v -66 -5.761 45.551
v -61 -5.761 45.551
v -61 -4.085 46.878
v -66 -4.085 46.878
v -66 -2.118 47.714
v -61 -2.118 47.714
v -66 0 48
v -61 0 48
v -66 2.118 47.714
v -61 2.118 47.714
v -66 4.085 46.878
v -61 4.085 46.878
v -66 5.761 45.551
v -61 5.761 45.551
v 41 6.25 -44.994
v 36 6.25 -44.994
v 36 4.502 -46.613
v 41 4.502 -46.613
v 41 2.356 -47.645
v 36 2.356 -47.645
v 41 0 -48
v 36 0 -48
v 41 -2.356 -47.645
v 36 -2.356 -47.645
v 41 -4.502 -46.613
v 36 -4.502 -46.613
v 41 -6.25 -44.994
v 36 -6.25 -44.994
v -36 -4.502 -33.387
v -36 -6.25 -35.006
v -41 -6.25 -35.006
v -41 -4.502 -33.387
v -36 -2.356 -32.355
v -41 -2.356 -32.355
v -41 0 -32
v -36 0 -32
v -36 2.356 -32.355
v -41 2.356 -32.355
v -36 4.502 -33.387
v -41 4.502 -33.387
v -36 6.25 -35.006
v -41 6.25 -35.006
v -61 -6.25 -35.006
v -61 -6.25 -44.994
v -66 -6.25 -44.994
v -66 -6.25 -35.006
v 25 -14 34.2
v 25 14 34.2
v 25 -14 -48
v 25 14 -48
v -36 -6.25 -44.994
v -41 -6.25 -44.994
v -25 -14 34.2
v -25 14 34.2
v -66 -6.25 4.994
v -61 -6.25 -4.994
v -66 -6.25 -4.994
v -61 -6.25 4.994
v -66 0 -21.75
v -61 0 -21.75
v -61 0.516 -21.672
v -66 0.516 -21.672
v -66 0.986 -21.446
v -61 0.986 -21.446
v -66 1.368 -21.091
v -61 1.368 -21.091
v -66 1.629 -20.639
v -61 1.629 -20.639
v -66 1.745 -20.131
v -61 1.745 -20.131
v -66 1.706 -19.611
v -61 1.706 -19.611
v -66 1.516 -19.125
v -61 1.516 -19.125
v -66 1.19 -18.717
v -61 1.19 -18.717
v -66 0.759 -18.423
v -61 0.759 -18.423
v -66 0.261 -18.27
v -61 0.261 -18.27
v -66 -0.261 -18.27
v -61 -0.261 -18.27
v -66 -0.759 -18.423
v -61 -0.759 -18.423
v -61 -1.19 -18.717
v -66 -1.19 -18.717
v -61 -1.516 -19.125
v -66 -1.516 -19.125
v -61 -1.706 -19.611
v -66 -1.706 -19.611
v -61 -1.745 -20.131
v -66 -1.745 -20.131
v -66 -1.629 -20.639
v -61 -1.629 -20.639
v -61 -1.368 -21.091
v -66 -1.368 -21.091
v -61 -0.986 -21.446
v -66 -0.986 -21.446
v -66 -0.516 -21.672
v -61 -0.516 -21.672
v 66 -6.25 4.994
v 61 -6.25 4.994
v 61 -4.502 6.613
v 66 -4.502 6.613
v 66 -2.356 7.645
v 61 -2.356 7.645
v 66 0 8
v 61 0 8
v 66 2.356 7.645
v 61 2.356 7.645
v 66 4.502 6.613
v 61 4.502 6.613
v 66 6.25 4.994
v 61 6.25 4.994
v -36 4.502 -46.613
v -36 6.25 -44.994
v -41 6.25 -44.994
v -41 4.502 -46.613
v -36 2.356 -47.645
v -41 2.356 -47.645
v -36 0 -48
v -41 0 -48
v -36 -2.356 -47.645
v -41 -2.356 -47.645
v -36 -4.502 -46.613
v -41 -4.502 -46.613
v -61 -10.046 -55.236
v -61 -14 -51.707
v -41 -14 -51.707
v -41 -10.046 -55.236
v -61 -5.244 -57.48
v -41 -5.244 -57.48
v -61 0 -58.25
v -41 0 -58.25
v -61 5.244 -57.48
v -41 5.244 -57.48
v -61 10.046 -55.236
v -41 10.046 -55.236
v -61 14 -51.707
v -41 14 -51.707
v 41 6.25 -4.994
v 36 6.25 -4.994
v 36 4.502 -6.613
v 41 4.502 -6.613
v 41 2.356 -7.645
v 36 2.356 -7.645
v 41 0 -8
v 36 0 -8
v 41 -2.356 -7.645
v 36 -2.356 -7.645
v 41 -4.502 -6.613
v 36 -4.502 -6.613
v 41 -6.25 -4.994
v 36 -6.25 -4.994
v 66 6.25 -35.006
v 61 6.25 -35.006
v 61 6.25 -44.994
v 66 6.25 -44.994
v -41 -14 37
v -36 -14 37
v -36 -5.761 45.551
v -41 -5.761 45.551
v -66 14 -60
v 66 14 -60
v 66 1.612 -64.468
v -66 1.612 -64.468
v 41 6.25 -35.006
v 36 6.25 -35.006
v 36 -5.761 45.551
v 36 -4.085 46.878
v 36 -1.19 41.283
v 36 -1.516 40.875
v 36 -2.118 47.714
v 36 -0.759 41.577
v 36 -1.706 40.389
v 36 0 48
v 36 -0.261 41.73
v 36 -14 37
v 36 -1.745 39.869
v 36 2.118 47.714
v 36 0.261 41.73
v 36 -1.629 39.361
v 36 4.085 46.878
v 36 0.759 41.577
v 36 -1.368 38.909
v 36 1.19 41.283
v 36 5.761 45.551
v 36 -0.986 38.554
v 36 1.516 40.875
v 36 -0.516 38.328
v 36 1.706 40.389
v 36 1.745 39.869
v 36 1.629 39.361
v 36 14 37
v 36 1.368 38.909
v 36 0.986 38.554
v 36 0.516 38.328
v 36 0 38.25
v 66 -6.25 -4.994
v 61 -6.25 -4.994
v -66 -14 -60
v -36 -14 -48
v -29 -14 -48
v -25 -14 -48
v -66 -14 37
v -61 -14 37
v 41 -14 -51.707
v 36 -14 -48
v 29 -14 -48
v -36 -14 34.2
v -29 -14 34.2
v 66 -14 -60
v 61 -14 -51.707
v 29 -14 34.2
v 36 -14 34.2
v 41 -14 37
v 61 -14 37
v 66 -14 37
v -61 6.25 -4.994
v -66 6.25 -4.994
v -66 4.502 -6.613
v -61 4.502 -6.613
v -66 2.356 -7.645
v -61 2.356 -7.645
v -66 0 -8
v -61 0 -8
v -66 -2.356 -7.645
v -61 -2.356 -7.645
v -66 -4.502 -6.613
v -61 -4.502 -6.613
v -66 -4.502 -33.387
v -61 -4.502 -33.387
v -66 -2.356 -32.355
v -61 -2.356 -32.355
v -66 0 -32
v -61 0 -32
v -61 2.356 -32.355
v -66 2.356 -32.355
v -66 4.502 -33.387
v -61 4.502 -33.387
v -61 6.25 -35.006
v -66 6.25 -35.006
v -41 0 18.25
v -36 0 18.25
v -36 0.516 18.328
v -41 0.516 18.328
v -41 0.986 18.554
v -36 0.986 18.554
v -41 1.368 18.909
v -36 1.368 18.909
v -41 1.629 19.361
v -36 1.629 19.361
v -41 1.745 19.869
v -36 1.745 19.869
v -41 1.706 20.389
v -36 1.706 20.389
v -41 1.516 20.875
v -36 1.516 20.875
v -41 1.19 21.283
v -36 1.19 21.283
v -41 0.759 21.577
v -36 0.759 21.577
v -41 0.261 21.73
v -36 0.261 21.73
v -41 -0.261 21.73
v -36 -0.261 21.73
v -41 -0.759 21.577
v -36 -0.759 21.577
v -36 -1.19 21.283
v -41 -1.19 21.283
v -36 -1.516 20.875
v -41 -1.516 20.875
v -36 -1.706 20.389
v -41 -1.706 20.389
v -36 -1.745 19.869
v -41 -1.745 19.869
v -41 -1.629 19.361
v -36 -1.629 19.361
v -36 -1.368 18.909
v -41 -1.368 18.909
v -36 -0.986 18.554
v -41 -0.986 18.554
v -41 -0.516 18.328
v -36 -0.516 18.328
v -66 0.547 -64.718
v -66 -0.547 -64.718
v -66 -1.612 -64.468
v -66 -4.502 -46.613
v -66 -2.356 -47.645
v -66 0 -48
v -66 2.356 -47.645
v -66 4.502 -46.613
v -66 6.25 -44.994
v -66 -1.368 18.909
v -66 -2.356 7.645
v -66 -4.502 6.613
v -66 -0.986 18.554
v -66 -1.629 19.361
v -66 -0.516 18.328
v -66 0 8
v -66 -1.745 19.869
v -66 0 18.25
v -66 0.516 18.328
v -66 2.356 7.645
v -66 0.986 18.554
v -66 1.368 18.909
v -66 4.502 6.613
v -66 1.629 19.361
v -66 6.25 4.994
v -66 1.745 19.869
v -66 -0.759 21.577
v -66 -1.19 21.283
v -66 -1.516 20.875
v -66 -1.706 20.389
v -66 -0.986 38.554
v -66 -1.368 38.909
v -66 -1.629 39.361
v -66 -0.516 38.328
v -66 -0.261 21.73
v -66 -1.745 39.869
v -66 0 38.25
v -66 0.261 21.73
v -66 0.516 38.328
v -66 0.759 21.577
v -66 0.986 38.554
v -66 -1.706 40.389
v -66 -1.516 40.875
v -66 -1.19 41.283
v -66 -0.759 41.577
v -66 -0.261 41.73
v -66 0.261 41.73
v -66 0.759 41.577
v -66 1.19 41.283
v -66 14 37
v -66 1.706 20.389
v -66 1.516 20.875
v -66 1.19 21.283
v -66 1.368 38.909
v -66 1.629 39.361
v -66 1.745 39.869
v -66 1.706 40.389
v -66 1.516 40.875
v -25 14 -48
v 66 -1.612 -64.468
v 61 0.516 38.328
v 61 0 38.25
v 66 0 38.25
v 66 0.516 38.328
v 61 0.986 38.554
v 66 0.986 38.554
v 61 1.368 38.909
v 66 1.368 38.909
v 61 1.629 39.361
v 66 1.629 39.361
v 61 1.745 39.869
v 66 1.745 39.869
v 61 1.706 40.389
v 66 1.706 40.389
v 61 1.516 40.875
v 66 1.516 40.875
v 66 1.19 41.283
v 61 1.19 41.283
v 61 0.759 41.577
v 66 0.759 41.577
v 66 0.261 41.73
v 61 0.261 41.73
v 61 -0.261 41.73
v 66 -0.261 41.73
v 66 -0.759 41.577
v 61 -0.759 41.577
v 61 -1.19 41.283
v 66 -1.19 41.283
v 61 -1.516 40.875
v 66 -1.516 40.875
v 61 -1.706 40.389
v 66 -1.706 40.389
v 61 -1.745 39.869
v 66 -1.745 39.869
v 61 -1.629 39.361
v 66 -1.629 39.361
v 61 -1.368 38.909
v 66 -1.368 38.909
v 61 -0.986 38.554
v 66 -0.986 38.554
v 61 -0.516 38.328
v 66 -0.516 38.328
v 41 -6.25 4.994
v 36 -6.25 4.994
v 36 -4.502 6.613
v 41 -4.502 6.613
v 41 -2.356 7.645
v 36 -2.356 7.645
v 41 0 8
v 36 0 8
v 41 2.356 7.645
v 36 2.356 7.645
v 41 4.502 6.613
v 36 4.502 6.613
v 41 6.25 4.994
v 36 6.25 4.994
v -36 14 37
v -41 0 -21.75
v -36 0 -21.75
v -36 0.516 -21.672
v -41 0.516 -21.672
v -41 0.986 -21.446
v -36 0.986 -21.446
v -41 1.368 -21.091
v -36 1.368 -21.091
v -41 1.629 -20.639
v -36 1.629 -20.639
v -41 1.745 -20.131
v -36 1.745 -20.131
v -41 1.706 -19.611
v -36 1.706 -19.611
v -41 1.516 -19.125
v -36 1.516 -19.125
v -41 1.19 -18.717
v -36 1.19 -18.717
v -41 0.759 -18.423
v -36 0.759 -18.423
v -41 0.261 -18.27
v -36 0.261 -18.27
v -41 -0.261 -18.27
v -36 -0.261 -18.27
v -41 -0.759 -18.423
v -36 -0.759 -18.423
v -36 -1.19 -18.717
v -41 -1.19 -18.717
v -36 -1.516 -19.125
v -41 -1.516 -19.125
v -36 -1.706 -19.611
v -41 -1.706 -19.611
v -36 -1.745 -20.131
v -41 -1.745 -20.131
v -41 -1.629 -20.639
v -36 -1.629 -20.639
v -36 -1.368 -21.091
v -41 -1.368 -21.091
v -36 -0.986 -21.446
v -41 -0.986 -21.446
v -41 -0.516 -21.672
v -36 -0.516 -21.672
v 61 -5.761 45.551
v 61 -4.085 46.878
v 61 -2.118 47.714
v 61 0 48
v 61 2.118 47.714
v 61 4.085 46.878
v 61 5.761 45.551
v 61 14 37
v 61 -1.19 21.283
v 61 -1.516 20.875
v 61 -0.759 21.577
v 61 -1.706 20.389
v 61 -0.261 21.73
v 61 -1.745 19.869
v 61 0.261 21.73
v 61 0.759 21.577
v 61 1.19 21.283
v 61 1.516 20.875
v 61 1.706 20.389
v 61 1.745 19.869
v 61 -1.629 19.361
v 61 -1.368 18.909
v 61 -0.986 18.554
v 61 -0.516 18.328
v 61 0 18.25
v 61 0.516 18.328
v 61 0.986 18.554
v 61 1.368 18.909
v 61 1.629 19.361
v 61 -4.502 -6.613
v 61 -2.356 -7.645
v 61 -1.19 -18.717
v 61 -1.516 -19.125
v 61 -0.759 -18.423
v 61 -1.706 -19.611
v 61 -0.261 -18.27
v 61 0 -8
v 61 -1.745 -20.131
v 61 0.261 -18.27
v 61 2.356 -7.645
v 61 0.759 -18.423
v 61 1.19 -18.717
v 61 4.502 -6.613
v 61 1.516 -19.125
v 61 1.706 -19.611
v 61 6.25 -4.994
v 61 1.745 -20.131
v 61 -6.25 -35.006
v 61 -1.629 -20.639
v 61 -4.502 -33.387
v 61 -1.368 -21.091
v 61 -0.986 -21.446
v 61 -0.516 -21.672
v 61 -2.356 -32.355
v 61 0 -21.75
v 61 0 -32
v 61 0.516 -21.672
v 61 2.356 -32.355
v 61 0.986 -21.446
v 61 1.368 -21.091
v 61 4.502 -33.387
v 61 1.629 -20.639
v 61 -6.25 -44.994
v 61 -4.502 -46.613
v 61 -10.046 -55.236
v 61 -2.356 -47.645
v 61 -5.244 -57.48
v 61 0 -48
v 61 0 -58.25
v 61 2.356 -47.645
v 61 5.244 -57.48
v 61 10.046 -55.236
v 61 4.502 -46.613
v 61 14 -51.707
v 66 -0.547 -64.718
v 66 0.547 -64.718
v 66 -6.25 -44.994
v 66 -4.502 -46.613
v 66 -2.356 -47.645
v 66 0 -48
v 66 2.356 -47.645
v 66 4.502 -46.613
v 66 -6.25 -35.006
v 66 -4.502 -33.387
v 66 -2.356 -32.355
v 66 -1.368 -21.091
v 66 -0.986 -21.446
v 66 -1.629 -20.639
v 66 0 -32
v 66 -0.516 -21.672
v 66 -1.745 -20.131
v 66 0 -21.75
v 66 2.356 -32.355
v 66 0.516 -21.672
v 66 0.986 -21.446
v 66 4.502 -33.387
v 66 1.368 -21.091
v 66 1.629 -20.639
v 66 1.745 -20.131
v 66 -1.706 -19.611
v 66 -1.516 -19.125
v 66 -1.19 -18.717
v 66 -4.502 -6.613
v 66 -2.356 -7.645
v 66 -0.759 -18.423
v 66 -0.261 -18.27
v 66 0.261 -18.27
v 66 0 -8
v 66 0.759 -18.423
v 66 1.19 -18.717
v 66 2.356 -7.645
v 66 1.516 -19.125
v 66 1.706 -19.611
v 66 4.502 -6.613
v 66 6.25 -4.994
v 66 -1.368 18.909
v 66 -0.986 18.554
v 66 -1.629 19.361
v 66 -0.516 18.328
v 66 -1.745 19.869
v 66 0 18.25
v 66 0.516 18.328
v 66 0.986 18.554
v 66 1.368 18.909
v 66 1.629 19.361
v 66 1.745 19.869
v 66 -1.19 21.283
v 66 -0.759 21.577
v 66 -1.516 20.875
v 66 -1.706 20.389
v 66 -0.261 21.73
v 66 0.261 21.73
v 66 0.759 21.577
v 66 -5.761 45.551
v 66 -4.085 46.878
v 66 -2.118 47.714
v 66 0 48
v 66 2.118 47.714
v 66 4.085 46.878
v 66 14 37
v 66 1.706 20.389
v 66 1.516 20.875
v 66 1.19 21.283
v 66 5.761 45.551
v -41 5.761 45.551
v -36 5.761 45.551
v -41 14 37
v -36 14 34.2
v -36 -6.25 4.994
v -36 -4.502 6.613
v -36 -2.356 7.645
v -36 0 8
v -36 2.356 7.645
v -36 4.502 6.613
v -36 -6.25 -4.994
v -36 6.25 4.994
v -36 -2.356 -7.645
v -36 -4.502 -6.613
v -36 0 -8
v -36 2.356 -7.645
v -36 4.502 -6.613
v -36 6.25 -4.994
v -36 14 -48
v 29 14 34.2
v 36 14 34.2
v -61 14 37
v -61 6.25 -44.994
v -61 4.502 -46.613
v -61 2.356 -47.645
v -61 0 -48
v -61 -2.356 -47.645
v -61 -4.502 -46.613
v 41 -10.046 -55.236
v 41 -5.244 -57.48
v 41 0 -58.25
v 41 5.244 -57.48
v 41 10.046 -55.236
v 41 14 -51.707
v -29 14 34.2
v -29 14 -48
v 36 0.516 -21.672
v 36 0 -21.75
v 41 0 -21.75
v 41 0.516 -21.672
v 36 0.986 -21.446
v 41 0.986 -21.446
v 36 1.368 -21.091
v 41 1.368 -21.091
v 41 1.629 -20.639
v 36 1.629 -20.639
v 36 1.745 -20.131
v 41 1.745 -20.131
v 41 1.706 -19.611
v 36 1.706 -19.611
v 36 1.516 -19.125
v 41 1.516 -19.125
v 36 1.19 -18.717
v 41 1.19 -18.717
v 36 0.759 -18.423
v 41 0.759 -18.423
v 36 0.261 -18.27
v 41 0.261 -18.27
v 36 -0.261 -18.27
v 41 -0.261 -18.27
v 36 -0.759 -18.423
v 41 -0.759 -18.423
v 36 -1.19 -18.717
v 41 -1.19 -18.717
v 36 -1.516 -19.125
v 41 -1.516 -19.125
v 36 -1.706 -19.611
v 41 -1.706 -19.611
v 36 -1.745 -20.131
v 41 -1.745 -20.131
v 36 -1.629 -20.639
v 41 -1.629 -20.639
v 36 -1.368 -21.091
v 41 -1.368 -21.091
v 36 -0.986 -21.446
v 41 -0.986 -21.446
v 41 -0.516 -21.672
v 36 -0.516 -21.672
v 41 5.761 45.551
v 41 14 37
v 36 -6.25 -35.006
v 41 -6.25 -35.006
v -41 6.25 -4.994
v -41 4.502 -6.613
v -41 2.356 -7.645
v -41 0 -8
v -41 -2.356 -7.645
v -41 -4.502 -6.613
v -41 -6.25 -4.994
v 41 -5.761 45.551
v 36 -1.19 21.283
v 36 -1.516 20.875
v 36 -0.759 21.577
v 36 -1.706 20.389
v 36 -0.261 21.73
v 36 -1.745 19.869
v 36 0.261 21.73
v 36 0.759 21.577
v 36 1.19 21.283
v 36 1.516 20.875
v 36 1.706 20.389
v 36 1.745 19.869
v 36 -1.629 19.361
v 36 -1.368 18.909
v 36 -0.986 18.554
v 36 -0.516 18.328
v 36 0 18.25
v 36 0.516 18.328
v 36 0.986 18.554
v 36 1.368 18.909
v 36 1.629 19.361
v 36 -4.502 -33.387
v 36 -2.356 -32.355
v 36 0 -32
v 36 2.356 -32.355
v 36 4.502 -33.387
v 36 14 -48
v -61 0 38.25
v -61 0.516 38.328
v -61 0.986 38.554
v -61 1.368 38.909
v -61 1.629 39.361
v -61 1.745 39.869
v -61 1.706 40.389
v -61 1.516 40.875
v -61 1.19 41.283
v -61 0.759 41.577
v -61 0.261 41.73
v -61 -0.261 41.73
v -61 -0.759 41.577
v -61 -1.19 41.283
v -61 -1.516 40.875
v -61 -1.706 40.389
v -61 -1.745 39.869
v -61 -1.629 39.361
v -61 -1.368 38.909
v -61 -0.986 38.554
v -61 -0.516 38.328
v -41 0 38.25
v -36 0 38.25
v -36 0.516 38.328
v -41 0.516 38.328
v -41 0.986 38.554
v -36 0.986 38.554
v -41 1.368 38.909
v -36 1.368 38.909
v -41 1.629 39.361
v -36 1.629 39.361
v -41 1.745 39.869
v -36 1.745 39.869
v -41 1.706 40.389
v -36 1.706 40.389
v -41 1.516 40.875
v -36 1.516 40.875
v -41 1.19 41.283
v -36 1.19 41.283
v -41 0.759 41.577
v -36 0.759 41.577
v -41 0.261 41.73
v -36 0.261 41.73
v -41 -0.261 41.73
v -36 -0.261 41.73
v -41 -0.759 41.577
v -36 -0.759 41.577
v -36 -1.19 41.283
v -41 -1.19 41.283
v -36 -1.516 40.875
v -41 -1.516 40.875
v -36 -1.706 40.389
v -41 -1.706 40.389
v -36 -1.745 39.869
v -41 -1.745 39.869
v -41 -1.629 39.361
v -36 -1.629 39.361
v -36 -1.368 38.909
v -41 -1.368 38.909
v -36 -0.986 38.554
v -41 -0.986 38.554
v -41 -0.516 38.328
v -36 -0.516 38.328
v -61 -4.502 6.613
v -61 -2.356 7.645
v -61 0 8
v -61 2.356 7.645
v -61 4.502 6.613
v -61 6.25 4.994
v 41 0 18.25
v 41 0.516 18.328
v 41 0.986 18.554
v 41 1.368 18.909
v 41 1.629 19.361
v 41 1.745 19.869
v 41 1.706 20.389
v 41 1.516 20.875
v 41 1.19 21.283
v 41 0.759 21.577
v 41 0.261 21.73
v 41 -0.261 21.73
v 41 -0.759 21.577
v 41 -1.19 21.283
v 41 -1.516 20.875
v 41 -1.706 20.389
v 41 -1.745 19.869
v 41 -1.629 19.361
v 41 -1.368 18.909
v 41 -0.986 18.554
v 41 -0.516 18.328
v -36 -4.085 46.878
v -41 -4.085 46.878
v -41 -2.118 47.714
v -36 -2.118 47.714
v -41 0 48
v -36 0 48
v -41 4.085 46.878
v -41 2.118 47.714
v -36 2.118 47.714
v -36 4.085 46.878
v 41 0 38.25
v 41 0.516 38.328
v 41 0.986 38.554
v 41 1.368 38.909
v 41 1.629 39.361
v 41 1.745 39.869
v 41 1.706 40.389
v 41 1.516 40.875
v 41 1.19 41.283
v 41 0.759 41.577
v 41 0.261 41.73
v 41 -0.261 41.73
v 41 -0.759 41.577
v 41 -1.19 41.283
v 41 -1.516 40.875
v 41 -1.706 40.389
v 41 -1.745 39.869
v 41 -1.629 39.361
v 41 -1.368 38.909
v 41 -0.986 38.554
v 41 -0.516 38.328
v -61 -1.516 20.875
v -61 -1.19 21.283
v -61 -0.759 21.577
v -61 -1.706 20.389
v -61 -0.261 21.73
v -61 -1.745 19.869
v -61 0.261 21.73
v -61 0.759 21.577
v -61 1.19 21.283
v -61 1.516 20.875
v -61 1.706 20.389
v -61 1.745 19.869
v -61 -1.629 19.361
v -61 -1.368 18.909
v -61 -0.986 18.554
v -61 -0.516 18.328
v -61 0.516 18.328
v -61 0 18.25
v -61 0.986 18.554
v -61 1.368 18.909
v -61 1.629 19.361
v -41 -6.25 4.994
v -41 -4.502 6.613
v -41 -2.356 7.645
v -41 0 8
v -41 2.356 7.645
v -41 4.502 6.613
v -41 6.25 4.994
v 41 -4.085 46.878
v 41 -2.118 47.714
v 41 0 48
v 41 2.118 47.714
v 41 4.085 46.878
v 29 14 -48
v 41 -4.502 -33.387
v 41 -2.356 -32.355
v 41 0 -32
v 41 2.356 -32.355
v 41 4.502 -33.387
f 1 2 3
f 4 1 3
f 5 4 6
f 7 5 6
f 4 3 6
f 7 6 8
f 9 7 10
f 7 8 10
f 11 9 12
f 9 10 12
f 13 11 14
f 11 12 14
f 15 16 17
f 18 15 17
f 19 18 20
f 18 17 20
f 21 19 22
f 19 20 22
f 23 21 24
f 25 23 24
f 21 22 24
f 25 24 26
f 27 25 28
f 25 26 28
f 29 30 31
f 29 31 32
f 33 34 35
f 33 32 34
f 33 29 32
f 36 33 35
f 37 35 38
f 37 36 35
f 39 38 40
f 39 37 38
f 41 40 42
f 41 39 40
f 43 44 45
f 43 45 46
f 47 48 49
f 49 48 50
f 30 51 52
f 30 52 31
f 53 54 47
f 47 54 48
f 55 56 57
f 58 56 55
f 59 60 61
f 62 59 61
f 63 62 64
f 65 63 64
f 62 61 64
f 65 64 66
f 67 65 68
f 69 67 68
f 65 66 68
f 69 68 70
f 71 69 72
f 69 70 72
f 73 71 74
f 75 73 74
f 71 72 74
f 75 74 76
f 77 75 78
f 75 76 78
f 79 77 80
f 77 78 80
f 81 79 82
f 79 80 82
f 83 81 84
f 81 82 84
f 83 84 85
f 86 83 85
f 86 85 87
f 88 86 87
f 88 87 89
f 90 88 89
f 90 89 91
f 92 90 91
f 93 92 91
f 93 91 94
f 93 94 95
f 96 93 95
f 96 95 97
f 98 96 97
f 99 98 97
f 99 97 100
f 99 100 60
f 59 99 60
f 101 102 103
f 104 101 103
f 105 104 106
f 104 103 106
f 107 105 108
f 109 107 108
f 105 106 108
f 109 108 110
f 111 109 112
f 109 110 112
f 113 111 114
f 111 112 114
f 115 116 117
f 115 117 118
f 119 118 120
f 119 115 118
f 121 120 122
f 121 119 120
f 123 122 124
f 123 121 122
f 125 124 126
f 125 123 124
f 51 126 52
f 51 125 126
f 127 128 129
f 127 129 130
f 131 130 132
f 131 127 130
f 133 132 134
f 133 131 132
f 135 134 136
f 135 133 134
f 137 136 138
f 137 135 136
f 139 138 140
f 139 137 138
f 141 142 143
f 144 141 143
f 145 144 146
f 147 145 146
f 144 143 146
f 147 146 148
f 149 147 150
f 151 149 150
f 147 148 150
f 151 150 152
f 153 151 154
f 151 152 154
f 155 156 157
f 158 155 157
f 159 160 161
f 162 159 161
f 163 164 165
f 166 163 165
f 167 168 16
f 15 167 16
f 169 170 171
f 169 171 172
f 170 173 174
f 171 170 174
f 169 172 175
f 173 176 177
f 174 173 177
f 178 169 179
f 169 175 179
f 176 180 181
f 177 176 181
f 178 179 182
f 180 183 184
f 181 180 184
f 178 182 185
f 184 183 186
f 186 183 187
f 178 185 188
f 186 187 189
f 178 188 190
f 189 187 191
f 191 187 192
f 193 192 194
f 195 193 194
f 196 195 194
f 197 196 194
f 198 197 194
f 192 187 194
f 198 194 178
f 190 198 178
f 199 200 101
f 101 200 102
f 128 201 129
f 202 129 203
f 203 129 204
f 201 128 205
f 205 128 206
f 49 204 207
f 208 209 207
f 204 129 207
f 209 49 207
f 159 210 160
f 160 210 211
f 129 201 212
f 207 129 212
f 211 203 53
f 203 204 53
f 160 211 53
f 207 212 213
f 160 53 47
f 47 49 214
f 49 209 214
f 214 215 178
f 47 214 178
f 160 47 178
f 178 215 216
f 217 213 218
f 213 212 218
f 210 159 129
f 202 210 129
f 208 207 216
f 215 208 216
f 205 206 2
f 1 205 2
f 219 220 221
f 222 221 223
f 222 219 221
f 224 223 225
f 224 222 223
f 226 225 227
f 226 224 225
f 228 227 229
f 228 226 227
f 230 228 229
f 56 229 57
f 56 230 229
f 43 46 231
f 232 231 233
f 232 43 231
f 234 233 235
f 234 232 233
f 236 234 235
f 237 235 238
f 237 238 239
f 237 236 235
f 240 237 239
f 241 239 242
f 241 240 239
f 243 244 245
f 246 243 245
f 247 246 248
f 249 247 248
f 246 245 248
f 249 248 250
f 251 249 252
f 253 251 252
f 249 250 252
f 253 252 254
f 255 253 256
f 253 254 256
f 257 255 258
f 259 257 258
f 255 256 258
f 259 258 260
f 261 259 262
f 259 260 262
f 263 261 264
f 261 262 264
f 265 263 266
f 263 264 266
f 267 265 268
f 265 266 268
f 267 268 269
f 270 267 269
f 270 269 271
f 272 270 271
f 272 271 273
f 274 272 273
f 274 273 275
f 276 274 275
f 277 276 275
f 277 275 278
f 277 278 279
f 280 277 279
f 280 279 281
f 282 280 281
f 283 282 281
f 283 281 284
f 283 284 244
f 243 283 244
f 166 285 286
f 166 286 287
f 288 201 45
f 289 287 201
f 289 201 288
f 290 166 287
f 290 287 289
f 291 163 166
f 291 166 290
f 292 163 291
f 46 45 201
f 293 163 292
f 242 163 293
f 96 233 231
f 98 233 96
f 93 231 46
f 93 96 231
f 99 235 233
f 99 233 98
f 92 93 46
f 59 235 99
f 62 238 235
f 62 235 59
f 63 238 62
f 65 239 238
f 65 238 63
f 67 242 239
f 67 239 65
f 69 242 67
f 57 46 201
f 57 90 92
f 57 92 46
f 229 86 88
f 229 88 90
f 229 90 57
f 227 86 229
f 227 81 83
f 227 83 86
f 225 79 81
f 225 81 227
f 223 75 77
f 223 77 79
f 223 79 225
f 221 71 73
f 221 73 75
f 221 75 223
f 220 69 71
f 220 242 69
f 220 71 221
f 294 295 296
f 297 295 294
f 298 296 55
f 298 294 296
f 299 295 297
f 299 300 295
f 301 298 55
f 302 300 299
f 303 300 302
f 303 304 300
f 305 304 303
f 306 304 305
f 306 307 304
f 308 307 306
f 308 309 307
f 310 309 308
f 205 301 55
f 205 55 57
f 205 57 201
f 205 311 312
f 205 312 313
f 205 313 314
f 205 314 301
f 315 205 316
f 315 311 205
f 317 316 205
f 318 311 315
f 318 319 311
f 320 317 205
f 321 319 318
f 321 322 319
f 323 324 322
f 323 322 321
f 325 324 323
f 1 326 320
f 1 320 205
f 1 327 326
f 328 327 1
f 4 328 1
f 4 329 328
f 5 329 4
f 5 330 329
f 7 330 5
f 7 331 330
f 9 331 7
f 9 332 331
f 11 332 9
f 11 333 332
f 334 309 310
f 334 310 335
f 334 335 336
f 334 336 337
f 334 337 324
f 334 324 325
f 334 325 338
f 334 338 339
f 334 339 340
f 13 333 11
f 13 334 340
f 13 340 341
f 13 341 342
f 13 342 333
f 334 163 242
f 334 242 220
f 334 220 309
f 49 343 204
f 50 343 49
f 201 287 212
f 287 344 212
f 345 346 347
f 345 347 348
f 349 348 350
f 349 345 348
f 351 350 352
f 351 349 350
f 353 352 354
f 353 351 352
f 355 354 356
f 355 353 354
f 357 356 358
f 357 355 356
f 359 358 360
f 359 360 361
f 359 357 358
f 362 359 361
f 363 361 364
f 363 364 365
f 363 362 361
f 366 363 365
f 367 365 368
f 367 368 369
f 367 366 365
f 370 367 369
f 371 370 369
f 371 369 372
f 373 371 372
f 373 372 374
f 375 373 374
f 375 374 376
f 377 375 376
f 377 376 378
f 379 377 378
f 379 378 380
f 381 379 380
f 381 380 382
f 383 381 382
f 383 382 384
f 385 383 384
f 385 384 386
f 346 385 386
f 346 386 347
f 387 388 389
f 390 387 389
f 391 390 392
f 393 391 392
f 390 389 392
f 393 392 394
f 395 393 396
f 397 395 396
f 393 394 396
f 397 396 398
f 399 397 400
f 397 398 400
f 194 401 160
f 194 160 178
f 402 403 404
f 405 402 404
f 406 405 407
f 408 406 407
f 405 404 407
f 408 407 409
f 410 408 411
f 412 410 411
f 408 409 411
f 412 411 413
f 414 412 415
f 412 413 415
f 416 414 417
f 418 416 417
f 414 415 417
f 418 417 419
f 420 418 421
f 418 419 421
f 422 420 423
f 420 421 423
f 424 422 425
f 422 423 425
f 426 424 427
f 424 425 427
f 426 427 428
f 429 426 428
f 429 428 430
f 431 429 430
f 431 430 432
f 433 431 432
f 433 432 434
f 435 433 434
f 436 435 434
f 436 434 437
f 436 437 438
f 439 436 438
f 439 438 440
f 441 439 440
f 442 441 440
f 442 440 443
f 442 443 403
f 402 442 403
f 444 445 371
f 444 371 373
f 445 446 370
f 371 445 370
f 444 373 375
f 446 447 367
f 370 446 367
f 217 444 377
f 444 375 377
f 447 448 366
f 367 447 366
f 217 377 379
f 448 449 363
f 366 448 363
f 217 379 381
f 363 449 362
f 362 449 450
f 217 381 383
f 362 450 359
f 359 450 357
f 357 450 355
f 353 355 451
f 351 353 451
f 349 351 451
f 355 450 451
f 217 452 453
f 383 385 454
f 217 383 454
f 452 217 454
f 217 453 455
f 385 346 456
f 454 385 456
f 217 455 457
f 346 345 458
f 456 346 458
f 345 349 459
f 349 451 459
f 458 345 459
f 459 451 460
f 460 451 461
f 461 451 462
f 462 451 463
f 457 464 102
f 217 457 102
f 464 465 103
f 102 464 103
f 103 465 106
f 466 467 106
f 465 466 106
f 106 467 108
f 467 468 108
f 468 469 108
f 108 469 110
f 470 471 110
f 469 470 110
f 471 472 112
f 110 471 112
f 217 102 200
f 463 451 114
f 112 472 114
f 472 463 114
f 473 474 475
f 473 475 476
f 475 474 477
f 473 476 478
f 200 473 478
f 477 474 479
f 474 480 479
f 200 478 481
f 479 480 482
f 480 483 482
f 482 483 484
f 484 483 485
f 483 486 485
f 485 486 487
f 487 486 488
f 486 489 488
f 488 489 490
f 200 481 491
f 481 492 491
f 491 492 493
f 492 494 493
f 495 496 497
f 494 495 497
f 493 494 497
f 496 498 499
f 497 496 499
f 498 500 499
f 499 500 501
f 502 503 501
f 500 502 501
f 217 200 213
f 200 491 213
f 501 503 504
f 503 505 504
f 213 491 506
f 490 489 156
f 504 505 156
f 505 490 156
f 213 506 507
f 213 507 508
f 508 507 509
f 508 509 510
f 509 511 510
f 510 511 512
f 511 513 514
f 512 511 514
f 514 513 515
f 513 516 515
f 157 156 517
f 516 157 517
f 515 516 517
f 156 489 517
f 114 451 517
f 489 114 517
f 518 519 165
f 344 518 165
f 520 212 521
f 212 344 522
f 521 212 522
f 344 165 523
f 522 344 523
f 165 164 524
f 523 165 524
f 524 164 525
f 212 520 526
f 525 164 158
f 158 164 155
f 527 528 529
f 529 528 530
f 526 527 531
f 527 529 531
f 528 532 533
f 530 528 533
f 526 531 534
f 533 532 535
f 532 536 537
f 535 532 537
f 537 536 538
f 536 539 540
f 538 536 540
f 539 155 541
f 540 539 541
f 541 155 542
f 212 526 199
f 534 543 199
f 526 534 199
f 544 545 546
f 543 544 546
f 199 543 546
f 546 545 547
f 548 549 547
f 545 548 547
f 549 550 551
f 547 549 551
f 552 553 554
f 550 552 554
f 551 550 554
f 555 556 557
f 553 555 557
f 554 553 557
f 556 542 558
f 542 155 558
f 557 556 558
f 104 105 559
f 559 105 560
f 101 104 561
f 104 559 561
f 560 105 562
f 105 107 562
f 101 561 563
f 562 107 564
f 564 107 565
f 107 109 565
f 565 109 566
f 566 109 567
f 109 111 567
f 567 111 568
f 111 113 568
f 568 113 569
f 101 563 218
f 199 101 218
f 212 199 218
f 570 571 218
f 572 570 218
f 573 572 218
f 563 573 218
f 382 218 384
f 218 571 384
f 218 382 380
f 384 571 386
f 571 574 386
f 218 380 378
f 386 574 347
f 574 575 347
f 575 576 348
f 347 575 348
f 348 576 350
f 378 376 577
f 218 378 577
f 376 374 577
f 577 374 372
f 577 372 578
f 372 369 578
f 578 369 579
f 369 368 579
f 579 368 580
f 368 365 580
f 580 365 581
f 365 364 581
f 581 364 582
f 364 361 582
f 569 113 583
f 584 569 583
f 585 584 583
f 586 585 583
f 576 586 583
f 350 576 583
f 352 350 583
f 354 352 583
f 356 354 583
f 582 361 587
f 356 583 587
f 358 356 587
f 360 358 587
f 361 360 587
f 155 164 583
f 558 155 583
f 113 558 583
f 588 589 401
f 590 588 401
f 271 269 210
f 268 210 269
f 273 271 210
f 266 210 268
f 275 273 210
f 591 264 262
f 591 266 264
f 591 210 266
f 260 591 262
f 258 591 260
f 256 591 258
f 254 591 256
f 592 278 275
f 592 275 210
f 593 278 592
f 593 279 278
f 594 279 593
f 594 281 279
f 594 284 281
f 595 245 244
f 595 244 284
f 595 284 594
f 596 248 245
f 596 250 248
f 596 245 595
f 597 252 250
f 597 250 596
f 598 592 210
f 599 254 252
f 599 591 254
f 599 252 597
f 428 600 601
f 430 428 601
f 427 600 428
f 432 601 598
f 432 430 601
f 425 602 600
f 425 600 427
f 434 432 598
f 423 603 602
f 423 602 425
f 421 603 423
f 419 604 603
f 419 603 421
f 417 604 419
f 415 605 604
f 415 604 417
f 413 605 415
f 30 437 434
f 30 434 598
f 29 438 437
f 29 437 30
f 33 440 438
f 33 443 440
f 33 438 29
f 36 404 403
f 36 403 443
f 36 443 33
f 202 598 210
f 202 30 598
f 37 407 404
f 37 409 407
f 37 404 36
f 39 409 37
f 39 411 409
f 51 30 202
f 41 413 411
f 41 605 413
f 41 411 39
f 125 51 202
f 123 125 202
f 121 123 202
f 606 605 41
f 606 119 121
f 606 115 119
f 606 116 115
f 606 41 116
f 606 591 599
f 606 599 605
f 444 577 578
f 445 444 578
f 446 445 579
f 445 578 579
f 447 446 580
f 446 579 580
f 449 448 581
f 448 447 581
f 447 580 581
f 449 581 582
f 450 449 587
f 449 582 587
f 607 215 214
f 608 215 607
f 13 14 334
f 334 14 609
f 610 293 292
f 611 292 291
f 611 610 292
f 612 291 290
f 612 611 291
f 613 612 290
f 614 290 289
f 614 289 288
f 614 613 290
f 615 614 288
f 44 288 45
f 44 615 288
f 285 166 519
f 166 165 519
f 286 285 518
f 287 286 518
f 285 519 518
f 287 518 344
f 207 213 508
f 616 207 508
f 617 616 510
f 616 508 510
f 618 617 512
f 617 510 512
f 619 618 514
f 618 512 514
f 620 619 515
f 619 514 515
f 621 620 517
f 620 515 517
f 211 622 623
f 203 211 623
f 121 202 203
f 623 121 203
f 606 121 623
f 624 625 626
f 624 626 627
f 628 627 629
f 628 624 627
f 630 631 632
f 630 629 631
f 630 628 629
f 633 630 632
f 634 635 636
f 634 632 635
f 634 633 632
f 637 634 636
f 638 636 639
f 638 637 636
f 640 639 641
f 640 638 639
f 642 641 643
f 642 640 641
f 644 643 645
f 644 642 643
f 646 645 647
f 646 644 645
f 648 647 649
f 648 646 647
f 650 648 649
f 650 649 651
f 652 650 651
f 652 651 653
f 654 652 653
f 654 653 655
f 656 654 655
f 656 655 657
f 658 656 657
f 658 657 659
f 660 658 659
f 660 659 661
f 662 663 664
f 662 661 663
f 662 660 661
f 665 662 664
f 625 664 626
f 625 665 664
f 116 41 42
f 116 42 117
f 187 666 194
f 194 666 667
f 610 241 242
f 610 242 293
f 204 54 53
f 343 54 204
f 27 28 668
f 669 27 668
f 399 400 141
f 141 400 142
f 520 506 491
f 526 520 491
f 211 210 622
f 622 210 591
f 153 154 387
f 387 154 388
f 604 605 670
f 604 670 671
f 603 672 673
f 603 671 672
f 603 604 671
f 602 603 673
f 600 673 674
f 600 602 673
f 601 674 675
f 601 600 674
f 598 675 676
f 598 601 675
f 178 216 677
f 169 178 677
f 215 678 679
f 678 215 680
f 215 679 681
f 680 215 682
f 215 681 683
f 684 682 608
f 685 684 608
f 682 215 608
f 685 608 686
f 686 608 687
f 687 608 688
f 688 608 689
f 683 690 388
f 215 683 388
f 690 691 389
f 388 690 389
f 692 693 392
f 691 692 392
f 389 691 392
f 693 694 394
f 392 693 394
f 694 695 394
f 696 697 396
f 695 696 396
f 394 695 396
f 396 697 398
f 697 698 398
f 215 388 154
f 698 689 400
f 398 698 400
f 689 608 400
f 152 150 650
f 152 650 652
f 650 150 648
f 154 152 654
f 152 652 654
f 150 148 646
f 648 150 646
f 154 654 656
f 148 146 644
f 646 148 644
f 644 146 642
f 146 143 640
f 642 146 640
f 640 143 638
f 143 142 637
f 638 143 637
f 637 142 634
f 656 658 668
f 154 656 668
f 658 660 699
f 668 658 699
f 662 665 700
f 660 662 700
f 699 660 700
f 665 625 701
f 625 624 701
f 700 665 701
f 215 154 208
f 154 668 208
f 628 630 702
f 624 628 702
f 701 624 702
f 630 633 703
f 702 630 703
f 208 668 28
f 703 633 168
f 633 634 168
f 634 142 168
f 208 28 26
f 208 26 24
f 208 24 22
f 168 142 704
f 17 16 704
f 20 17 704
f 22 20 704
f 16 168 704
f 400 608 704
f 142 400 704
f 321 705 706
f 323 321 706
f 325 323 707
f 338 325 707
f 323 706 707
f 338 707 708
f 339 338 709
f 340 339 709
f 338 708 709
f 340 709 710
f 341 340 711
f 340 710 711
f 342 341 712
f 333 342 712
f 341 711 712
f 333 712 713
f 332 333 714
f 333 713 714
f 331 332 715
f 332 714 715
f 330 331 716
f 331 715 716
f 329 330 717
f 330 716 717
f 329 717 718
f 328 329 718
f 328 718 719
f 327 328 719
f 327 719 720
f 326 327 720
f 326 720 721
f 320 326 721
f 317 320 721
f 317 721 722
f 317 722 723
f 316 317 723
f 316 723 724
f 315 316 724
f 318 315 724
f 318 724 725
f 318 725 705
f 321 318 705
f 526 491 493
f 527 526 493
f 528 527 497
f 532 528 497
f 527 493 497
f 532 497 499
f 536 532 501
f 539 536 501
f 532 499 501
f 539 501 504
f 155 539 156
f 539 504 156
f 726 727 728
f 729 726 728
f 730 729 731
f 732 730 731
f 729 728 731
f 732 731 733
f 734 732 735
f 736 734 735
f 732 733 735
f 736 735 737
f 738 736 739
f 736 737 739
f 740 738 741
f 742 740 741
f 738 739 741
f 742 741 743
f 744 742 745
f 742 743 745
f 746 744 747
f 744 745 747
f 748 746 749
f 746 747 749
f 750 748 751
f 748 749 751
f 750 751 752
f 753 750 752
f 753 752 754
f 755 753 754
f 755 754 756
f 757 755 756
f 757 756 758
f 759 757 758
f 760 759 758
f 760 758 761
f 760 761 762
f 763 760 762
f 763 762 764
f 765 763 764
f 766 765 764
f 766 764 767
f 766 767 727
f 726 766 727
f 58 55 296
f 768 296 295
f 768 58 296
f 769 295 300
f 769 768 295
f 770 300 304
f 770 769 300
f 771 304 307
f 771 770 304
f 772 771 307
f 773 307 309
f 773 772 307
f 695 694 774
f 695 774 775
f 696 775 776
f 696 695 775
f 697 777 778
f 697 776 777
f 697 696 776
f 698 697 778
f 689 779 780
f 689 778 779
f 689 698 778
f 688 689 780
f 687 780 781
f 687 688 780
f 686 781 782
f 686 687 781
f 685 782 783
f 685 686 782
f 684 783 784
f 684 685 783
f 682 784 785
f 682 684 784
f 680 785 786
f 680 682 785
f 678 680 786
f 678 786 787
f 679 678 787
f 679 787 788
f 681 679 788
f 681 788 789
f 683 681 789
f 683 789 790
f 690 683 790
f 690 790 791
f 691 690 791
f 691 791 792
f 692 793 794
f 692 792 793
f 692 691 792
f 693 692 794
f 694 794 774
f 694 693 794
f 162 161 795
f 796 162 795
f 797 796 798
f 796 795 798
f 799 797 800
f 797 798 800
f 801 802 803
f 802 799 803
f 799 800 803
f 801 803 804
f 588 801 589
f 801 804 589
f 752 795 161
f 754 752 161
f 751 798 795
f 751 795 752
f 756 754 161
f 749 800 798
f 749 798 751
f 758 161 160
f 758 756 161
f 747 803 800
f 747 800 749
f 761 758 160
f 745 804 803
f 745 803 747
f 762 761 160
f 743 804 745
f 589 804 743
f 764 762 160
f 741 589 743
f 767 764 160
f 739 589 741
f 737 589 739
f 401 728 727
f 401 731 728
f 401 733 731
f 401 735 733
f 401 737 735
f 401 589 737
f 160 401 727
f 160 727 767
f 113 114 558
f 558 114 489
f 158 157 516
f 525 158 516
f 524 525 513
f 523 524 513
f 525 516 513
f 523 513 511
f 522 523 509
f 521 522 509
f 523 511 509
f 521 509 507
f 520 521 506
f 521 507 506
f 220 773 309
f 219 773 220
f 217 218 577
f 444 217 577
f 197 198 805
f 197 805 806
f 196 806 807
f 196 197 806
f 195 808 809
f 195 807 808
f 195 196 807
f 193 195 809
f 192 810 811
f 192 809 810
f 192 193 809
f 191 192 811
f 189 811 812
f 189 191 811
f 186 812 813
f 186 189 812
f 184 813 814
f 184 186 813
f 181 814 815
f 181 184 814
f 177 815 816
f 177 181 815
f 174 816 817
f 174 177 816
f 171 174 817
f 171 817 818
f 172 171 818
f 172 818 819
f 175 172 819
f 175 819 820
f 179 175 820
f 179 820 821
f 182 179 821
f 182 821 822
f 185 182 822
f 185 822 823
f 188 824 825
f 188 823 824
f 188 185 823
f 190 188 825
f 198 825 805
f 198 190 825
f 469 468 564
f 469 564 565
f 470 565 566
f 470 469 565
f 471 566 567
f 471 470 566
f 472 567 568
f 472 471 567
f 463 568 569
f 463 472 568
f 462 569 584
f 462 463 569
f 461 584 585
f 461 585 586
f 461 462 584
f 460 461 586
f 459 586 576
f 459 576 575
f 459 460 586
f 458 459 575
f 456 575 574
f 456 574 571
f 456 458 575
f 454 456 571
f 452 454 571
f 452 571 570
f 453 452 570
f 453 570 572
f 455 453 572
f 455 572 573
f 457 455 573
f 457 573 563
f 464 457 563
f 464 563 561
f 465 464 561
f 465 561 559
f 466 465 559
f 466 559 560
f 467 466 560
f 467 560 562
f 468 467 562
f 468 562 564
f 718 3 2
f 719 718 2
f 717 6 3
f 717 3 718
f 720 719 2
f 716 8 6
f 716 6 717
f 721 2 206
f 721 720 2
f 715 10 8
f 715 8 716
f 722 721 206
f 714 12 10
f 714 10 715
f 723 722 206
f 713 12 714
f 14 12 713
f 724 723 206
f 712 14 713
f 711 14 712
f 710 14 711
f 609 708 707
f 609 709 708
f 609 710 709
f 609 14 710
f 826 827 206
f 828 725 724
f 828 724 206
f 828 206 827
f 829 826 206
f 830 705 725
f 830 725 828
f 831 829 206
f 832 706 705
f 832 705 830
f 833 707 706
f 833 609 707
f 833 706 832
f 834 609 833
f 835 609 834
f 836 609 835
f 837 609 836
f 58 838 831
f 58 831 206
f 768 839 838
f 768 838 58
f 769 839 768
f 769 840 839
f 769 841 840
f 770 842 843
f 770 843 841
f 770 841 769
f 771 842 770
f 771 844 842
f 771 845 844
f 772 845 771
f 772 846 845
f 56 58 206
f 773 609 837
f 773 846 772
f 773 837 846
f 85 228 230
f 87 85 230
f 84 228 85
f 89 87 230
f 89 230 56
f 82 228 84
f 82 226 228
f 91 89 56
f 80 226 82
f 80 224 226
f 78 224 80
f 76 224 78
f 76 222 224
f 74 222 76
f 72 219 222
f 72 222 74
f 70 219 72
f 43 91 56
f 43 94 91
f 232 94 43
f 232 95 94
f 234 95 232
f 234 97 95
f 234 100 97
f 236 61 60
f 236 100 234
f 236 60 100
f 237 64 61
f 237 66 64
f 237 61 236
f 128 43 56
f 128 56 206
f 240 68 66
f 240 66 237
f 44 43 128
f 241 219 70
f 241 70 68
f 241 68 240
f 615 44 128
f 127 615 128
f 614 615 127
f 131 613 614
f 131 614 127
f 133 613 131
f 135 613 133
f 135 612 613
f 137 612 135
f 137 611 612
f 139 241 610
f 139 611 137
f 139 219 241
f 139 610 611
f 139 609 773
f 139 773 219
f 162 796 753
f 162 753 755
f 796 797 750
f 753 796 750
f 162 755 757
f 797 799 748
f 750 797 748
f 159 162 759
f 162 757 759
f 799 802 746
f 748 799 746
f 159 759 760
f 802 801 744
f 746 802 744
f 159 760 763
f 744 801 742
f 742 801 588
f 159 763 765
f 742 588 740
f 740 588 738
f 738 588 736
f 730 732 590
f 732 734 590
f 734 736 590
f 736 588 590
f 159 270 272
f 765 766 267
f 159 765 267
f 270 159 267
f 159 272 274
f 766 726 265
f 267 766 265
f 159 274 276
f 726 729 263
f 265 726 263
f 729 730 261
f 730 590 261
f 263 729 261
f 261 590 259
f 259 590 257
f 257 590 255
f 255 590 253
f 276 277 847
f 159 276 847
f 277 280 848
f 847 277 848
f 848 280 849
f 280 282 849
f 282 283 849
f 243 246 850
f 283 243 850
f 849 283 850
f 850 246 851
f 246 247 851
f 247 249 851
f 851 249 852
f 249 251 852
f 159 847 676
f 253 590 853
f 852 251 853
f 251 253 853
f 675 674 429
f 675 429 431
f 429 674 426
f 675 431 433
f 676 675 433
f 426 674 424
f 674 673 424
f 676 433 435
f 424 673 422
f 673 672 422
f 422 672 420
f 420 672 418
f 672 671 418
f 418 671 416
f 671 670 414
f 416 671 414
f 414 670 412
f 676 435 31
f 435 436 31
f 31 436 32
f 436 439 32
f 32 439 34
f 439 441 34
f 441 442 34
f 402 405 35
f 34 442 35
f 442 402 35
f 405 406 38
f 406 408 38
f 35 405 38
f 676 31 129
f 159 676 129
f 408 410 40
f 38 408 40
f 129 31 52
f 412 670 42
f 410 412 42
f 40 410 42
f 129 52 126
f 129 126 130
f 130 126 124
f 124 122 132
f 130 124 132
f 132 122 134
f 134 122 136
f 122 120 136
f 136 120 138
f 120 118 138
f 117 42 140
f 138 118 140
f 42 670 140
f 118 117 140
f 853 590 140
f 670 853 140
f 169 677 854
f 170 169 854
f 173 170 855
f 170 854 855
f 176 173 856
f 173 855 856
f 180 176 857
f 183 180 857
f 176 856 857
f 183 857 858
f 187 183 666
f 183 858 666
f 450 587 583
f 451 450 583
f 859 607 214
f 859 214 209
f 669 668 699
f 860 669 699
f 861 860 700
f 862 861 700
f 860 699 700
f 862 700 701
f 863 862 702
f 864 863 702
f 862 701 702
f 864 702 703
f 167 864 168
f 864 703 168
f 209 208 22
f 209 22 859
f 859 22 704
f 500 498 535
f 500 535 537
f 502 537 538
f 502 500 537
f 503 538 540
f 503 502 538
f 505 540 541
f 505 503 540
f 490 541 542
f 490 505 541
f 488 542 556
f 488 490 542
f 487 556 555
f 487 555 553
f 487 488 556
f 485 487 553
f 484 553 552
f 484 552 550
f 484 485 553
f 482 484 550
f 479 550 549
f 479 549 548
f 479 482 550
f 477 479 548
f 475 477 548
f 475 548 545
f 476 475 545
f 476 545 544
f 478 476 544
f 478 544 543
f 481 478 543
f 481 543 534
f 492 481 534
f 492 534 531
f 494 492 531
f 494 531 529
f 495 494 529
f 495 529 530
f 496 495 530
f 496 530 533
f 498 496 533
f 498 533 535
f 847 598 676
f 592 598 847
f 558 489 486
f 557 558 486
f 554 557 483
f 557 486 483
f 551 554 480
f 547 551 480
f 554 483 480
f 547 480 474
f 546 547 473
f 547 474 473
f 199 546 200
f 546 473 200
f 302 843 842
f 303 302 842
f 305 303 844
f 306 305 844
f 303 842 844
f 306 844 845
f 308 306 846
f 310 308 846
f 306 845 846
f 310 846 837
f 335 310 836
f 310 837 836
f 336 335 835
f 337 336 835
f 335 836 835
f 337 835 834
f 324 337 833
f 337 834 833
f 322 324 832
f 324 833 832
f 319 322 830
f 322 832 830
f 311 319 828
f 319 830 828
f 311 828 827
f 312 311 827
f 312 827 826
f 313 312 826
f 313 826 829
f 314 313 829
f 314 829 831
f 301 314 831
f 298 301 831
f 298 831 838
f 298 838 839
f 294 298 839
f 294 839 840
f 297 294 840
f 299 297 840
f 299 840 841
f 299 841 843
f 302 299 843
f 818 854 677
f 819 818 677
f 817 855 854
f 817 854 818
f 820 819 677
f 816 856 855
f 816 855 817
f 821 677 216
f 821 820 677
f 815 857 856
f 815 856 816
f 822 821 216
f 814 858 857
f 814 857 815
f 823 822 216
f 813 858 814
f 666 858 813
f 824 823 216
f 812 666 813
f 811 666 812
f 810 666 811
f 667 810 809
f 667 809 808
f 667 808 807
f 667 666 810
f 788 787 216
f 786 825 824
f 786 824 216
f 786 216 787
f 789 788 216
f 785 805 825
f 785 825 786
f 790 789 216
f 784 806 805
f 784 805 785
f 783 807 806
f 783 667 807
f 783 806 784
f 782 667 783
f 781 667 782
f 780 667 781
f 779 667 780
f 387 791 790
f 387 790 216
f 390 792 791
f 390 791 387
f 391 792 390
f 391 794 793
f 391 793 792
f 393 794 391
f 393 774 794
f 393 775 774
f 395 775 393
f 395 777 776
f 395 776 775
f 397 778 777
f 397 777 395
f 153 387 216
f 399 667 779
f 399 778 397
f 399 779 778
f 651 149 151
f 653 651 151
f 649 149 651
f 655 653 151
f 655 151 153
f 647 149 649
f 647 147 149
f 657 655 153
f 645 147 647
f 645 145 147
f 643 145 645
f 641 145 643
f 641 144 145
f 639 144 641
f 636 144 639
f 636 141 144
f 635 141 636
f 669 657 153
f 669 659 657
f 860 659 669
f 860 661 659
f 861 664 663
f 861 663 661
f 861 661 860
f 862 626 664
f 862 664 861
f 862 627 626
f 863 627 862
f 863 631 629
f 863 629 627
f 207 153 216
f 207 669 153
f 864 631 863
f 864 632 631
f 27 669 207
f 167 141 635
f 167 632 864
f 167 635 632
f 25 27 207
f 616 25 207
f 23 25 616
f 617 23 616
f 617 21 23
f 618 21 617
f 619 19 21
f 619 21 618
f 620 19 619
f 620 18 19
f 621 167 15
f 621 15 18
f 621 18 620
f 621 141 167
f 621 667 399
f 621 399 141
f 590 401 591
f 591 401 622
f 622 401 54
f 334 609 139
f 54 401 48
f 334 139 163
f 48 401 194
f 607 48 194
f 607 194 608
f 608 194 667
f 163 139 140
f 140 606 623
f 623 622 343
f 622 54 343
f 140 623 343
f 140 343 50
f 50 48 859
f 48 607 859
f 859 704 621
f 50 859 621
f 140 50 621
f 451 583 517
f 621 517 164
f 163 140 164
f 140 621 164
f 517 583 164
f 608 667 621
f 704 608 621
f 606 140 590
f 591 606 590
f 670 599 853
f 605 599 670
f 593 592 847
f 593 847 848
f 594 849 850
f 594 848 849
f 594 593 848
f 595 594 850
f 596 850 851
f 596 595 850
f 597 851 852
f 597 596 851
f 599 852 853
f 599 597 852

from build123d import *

# Parameters (mm, degrees)
BOSS_EXTRUDE1_DEPTH = 66
CUT_EXTRUDE3_START  = -5
CUT_EXTRUDE3_DEPTH  = 20
CUT_EXTRUDE4_START  = -5
SKETCH5_W           = 82.2
SKETCH5_H           = 28
CUT_EXTRUDE4_DEPTH  = 7
CUT_EXTRUDE5_START  = 29
SKETCH1_13_R        = 1.75
CUT_EXTRUDE5_DEPTH  = 37
SKETCH7_W           = 72
SKETCH7_H           = 11
CUT_EXTRUDE7_DEPTH  = 97.605188784
SKETCH8_W           = 50
SKETCH8_H           = 82.2
CUT_EXTRUDE8_DEPTH  = 97.605188784


with BuildPart() as part:
    # Sketch1 → Boss-Extrude1 (new, symmetric)
    with BuildSketch(Plane(origin=(0, 0, 0), x_dir=(0, 0, -1), z_dir=(1, 0, 0))):
        with BuildLine():
            Line((60, 14), (64.468246011, 1.611607143))
            ThreePointArc((64.468246011, 1.611607143), (64.75, 0), (64.468246011, -1.611607143))
            Line((64.468246011, -1.611607143), (60, -14))
            Line((60, -14), (-37, -14))
            Line((-37, -14), (-45.550860067, -5.760898586))
            ThreePointArc((-45.550860067, -5.760898586), (-48, 0), (-45.550860067, 5.760898586))
            Line((-45.550860067, 5.760898586), (-37, 14))
            Line((-37, 14), (60, 14))
        make_face()
    extrude(amount=BOSS_EXTRUDE1_DEPTH, both=True)

    # Sketch4 → Cut-Extrude3 (cut)
    with BuildSketch(Plane(origin=(66, 0, 0), x_dir=(0, 0, -1), z_dir=(1, 0, 0)).offset(CUT_EXTRUDE3_START)):
        with BuildLine():
            ThreePointArc((51.707369474, -14), (58.25, 0), (51.707369474, 14))
            Line((51.707369474, 14), (-37, 14))
            Line((-37, 14), (-45.550860067, 5.760898586))
            ThreePointArc((-45.550860067, 5.760898586), (-48, 0), (-45.550860067, -5.760898586))
            Line((-45.550860067, -5.760898586), (-37, -14))
            Line((-37, -14), (51.707369474, -14))
        make_face()
    cut_extrude3 = extrude(amount=-CUT_EXTRUDE3_DEPTH, mode=Mode.SUBTRACT)

    # Sketch5 → Cut-Extrude4 (cut)
    with BuildSketch(Plane(origin=(41, 0, 0), x_dir=(0, 0, -1), z_dir=(1, 0, 0)).offset(CUT_EXTRUDE4_START)):
        with Locations((6.9, 0)):
            Rectangle(SKETCH5_W, SKETCH5_H)
    cut_extrude4 = extrude(amount=-CUT_EXTRUDE4_DEPTH, mode=Mode.SUBTRACT)

    # Sketch1<13> → Cut-Extrude5 (cut)
    with BuildSketch(Plane(origin=(0, 0, 0), x_dir=(0, 0, -1), z_dir=(1, 0, 0)).offset(CUT_EXTRUDE5_START)):
        with BuildLine():
            Line((4.993746089, -6.25), (-4.993746089, -6.25))
            ThreePointArc((-4.993746089, -6.25), (-8, 0), (-4.993746089, 6.25))
            Line((-4.993746089, 6.25), (4.993746089, 6.25))
            ThreePointArc((4.993746089, 6.25), (8, 0), (4.993746089, -6.25))
        make_face()
        with BuildLine():
            Line((44.993746089, -6.25), (35.006253911, -6.25))
            ThreePointArc((35.006253911, -6.25), (32, 0), (35.006253911, 6.25))
            Line((35.006253911, 6.25), (44.993746089, 6.25))
            ThreePointArc((44.993746089, 6.25), (48, 0), (44.993746089, -6.25))
        make_face()
        with Locations((-20, 0)):
            Circle(SKETCH1_13_R)
        with Locations((20, 0)):
            Circle(SKETCH1_13_R)
        with Locations((-40, 0)):
            Circle(SKETCH1_13_R)
    cut_extrude5 = extrude(amount=CUT_EXTRUDE5_DEPTH, mode=Mode.SUBTRACT)

    # Mirror2: Cut-Extrude3, Cut-Extrude4, Cut-Extrude5 across plane
    add(cut_extrude3.mirror(Plane(origin=(0, 0, 0), x_dir=(0, 0, 1), z_dir=(1, 0, 0))), mode=Mode.SUBTRACT)
    add(cut_extrude4.mirror(Plane(origin=(0, 0, 0), x_dir=(0, 0, 1), z_dir=(1, 0, 0))), mode=Mode.SUBTRACT)
    add(cut_extrude5.mirror(Plane(origin=(0, 0, 0), x_dir=(0, 0, 1), z_dir=(1, 0, 0))), mode=Mode.SUBTRACT)

    # Sketch7 → Cut-Extrude7 (cut, through all)
    with BuildSketch(Plane(origin=(0, 14, 0), x_dir=(1, 0, 0), z_dir=(0, 1, 0))):
        with Locations((0, -42.5)):
            Rectangle(SKETCH7_W, SKETCH7_H)
    extrude(amount=-CUT_EXTRUDE7_DEPTH, mode=Mode.SUBTRACT)

    # Sketch8 → Cut-Extrude8 (cut, through all)
    with BuildSketch(Plane(origin=(0, 14, 0), x_dir=(1, 0, 0), z_dir=(0, 1, 0))):
        with Locations((0, 6.9)):
            Rectangle(SKETCH8_W, SKETCH8_H)
    extrude(amount=-CUT_EXTRUDE8_DEPTH, mode=Mode.SUBTRACT)


solid = part.part
